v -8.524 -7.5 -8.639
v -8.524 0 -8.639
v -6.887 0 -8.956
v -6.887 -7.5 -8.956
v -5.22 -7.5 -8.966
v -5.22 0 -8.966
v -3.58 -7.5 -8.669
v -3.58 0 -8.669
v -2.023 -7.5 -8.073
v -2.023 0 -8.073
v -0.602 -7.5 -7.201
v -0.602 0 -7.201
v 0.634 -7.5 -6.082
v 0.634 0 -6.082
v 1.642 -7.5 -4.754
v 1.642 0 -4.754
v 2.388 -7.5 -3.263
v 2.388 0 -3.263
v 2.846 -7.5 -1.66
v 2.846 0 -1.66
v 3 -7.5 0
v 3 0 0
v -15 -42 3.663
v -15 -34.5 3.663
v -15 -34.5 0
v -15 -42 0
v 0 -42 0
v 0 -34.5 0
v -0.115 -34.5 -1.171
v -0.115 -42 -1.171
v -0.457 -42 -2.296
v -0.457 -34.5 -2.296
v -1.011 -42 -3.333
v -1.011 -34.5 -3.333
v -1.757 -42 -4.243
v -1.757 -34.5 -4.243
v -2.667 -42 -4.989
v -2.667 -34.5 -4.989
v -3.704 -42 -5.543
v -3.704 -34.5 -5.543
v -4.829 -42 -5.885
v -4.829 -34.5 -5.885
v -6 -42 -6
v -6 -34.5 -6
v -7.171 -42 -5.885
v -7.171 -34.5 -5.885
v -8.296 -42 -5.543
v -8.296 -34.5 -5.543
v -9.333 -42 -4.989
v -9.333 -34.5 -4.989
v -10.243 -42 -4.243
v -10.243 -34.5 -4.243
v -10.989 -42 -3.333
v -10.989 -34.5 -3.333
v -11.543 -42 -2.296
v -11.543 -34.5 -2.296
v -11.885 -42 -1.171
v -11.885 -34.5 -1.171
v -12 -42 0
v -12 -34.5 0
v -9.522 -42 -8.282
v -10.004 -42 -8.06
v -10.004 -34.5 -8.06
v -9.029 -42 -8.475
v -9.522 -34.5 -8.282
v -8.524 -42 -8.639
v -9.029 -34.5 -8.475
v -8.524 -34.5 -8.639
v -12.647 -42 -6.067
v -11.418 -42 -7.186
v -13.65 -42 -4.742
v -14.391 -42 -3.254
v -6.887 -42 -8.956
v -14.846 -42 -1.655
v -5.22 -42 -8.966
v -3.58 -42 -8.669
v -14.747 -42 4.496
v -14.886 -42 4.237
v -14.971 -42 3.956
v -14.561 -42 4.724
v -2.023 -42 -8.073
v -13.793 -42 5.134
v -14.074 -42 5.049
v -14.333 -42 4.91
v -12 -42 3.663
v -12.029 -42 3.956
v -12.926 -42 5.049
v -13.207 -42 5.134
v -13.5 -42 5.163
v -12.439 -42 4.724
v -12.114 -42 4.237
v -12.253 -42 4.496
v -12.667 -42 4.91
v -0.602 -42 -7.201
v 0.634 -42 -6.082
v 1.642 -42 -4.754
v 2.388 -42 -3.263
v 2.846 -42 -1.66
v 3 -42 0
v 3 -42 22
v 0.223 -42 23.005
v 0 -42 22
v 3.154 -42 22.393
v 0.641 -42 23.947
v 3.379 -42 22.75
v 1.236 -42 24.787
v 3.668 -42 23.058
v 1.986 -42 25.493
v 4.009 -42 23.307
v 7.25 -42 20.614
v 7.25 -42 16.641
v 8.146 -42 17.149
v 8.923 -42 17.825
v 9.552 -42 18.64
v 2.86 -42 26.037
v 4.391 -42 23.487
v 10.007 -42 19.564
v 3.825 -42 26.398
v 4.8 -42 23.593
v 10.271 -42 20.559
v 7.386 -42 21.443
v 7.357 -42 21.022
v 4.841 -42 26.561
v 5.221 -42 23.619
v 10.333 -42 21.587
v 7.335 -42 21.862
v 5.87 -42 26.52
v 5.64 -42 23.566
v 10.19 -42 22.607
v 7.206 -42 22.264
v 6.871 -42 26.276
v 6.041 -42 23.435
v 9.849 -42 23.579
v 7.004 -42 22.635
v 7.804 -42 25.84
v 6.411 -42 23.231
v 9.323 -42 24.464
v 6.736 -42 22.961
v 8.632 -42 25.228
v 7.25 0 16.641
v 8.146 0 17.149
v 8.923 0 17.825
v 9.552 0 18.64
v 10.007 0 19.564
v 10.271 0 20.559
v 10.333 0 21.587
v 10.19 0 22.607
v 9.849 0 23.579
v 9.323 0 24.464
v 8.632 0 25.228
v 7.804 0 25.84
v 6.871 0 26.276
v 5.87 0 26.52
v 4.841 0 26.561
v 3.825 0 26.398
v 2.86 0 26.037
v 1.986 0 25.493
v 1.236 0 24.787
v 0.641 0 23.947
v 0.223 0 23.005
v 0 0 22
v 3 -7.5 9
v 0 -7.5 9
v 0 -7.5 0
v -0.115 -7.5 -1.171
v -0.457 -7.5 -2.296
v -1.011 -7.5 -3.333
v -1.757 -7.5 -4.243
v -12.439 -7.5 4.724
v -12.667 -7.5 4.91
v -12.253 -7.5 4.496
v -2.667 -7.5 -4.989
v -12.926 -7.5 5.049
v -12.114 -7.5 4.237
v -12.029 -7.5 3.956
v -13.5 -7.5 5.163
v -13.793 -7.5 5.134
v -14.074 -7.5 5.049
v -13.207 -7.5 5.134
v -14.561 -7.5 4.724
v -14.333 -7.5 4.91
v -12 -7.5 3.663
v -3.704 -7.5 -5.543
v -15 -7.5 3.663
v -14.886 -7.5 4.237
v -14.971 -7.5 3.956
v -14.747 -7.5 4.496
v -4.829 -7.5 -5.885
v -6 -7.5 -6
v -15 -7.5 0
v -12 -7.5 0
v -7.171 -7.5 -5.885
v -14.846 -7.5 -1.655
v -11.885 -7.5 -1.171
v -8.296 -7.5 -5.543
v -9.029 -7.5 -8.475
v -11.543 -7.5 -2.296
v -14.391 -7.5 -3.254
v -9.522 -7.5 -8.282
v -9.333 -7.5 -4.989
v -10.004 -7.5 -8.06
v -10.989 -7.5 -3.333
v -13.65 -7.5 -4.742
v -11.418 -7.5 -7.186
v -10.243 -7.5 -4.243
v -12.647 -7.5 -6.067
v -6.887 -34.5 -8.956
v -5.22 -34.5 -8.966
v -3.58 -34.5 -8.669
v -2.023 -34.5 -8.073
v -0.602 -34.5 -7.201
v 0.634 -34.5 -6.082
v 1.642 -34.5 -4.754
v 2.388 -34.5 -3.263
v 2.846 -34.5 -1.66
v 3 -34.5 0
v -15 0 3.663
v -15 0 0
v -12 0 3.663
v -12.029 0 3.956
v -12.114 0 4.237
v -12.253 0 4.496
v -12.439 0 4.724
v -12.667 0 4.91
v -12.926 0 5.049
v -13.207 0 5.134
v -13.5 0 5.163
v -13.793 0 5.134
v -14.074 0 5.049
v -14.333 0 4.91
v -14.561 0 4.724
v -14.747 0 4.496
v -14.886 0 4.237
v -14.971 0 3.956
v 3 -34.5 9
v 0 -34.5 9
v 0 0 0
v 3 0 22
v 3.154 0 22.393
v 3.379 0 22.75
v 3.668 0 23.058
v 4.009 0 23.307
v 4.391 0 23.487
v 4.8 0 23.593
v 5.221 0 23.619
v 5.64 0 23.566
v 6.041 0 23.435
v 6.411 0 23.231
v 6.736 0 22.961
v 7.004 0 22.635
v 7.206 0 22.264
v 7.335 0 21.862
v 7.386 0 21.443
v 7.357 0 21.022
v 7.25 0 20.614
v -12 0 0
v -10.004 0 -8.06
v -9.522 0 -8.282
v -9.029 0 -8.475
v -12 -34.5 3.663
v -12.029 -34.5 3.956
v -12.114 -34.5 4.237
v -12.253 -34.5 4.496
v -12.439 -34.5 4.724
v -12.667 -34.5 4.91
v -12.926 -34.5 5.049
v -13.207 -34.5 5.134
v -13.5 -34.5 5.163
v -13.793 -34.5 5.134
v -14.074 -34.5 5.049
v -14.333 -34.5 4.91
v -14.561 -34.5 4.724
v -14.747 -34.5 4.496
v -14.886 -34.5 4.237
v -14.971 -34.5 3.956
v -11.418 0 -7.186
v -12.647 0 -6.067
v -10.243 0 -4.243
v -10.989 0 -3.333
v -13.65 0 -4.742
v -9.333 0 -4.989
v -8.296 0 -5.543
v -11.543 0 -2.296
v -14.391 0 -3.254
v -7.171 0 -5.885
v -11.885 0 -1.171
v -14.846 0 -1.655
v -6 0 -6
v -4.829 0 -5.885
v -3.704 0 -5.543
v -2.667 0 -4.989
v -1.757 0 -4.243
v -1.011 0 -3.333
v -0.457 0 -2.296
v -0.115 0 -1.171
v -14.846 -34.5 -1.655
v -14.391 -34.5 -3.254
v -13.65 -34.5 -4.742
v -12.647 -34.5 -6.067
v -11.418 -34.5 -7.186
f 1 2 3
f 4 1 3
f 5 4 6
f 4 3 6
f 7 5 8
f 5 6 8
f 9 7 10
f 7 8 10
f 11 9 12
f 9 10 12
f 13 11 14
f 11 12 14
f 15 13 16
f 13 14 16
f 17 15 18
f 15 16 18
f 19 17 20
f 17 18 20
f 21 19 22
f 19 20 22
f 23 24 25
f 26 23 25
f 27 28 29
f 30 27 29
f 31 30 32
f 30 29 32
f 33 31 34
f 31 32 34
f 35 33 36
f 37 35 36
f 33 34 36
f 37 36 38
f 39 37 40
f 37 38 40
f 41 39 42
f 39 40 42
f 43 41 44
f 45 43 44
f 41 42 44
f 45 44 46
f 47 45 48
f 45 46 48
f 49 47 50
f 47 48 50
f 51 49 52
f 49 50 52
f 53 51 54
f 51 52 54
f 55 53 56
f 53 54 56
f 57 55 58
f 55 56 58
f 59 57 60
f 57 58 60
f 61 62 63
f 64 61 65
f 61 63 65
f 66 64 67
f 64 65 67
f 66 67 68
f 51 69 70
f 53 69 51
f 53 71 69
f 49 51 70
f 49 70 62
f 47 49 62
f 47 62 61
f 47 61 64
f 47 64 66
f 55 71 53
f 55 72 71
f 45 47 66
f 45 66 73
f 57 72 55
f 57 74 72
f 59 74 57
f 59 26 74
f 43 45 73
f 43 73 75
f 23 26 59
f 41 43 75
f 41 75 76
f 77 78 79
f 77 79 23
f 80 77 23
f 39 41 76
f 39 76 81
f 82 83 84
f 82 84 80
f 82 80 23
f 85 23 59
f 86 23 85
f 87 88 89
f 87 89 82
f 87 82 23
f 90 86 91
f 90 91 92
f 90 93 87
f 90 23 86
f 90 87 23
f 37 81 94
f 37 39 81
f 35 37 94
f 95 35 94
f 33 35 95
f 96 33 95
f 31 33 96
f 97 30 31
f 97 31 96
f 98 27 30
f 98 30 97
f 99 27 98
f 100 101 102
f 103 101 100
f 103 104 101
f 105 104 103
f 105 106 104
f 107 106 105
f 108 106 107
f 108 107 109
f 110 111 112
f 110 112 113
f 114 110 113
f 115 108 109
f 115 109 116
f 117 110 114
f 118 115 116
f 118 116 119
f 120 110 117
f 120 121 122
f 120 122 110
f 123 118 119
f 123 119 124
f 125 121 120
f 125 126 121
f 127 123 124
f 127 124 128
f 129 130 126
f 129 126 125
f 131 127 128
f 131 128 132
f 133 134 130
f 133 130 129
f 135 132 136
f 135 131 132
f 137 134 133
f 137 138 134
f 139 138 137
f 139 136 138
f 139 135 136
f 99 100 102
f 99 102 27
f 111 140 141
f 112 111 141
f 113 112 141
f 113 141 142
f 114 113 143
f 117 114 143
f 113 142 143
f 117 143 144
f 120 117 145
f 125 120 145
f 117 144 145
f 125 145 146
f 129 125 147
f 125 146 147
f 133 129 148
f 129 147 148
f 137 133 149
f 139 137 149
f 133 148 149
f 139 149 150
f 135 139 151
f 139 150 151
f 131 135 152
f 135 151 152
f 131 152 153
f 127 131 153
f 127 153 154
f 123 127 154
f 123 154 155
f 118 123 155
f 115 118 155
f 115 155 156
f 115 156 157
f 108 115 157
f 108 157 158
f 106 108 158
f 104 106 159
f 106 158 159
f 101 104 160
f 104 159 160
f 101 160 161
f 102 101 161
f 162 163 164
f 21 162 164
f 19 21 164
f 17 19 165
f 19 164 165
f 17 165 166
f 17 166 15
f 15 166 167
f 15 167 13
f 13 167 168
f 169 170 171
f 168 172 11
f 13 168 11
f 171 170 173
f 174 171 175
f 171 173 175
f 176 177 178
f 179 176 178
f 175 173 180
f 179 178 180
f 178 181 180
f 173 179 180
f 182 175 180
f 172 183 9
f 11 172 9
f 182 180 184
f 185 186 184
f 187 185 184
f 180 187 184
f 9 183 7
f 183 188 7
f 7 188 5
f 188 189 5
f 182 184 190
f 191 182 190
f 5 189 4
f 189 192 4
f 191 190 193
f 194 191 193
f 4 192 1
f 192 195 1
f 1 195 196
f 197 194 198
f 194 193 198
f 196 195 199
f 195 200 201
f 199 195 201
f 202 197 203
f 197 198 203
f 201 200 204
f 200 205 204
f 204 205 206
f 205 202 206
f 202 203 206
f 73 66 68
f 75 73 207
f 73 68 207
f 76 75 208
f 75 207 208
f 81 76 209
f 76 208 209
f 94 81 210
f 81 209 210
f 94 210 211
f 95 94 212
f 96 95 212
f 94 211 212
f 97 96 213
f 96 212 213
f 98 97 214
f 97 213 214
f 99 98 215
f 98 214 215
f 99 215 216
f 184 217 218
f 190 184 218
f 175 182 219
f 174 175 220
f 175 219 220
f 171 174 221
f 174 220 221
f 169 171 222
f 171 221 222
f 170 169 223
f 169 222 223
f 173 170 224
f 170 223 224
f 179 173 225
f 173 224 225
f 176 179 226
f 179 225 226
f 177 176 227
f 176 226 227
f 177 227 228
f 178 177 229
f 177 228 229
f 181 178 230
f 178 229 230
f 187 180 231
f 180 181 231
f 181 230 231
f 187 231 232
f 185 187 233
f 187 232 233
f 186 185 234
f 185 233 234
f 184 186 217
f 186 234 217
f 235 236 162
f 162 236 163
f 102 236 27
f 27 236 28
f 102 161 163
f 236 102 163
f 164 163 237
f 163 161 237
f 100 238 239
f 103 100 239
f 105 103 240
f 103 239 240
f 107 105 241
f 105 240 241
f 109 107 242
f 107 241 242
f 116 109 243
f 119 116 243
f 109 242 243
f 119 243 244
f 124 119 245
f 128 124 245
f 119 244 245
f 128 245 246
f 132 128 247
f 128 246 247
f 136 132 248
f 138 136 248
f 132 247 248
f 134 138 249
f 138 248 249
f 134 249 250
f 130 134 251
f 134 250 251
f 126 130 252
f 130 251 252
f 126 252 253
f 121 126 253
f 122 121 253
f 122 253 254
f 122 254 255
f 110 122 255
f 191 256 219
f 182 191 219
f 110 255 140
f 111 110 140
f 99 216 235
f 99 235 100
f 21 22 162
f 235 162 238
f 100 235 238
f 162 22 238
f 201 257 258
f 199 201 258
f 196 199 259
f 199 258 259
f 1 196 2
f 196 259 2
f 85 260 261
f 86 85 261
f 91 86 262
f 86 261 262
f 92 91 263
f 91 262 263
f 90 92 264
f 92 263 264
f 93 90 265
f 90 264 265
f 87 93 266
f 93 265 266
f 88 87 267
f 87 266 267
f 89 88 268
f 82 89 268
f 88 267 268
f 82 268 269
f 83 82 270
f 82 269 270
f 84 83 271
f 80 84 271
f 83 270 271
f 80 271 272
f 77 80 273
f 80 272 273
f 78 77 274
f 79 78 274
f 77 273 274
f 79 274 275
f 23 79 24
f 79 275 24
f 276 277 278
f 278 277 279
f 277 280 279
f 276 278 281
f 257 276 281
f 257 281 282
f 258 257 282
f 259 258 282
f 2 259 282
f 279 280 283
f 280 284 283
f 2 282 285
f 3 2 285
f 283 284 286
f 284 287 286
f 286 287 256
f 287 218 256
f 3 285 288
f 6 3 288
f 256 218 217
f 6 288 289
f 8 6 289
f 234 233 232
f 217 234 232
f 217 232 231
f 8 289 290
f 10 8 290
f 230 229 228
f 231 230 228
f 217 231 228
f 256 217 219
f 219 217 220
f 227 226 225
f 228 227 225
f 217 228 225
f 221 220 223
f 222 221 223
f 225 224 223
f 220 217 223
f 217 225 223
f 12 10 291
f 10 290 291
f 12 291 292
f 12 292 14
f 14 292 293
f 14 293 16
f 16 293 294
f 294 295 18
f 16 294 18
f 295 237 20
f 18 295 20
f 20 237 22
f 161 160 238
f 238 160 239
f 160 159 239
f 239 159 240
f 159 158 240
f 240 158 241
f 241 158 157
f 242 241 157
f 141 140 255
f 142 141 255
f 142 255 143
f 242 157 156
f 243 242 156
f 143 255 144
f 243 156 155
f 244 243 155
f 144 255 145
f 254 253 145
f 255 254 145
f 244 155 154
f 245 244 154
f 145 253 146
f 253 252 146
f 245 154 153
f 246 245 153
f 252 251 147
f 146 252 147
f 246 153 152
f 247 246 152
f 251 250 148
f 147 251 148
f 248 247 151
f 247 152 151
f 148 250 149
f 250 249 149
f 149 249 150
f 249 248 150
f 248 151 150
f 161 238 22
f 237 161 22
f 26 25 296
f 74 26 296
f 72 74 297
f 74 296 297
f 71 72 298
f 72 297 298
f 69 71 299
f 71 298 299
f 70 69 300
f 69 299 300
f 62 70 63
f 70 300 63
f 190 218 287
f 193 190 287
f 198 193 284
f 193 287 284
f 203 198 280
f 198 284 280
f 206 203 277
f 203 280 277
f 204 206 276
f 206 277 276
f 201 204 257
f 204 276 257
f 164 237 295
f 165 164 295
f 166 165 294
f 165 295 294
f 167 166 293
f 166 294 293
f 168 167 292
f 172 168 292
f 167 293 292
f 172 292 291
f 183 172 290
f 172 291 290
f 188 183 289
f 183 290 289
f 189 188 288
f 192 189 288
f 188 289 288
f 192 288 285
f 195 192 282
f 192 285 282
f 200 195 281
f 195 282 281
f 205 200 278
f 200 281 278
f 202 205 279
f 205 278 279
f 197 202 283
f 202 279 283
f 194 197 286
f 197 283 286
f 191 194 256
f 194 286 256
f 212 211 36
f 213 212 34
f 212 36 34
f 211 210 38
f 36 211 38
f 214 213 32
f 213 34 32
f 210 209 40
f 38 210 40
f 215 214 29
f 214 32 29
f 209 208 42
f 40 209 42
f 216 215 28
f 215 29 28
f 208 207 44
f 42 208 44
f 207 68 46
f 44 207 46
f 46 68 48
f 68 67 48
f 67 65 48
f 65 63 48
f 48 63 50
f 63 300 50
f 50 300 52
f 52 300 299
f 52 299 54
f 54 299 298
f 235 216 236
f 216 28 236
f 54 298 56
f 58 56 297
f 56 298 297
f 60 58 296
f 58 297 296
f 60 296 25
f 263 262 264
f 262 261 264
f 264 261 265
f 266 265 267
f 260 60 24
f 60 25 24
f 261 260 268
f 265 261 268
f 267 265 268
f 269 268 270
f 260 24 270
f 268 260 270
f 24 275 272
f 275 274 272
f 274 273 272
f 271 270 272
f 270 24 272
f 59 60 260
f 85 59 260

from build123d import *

# Parameters (mm, degrees)
F1_DEPTH = 42
F3_DEPTH = 16.5


with BuildPart() as f1:
    # F0 (on Front) → F1 (new body)
    with BuildSketch(Plane.XZ):
        with BuildLine():
            Line((0, 22), (0, 13.536567))
            Line((0, 13.536567), (0, 0))
            ThreePointArc((0, 0), (-6, -6), (-12, 0))
            Line((-12, 0), (-12, 3.663141))
            ThreePointArc((-12, 3.663141), (-13.5, 5.163141), (-15, 3.663141))
            Line((-15, 3.663141), (-15, 0))
            ThreePointArc((-15, 0), (-13.649713, -4.741507), (-10.004025, -8.060259))
            Line((-10.004025, -8.060259), (-8.524168, -8.638783))
            ThreePointArc((-8.524168, -8.638783), (-0.601737, -7.201302), (3, 0))
            Line((3, 0), (3, 22))
            ThreePointArc((3, 22), (5.843606, 23.509868), (7.25, 20.613689))
            Line((7.25, 20.613689), (7.25, 16.640851))
            ThreePointArc((7.25, 16.640851), (8.233139, 25.554439), (0, 22))
        make_face()
        with BuildLine():
            Line((-8.524168, -8.638783), (-10.004025, -8.060259))
            ThreePointArc((-10.004025, -8.060259), (-9.276889, -8.382243), (-8.524168, -8.638783))
        make_face()
    extrude(amount=F1_DEPTH)

    # F2 (on face) → F3 (cut, symmetric)
    with BuildSketch(Plane(origin=(0, 0, 0), x_dir=(0, -1, 0), z_dir=(-1, 0, 0))):
        Polygon((7.5, 9), (7.5, -16.111853), (34.5, -18.625535), (34.5, 9), align=None)
    extrude(amount=F3_DEPTH, both=True, mode=Mode.SUBTRACT)


solid = f1.part
